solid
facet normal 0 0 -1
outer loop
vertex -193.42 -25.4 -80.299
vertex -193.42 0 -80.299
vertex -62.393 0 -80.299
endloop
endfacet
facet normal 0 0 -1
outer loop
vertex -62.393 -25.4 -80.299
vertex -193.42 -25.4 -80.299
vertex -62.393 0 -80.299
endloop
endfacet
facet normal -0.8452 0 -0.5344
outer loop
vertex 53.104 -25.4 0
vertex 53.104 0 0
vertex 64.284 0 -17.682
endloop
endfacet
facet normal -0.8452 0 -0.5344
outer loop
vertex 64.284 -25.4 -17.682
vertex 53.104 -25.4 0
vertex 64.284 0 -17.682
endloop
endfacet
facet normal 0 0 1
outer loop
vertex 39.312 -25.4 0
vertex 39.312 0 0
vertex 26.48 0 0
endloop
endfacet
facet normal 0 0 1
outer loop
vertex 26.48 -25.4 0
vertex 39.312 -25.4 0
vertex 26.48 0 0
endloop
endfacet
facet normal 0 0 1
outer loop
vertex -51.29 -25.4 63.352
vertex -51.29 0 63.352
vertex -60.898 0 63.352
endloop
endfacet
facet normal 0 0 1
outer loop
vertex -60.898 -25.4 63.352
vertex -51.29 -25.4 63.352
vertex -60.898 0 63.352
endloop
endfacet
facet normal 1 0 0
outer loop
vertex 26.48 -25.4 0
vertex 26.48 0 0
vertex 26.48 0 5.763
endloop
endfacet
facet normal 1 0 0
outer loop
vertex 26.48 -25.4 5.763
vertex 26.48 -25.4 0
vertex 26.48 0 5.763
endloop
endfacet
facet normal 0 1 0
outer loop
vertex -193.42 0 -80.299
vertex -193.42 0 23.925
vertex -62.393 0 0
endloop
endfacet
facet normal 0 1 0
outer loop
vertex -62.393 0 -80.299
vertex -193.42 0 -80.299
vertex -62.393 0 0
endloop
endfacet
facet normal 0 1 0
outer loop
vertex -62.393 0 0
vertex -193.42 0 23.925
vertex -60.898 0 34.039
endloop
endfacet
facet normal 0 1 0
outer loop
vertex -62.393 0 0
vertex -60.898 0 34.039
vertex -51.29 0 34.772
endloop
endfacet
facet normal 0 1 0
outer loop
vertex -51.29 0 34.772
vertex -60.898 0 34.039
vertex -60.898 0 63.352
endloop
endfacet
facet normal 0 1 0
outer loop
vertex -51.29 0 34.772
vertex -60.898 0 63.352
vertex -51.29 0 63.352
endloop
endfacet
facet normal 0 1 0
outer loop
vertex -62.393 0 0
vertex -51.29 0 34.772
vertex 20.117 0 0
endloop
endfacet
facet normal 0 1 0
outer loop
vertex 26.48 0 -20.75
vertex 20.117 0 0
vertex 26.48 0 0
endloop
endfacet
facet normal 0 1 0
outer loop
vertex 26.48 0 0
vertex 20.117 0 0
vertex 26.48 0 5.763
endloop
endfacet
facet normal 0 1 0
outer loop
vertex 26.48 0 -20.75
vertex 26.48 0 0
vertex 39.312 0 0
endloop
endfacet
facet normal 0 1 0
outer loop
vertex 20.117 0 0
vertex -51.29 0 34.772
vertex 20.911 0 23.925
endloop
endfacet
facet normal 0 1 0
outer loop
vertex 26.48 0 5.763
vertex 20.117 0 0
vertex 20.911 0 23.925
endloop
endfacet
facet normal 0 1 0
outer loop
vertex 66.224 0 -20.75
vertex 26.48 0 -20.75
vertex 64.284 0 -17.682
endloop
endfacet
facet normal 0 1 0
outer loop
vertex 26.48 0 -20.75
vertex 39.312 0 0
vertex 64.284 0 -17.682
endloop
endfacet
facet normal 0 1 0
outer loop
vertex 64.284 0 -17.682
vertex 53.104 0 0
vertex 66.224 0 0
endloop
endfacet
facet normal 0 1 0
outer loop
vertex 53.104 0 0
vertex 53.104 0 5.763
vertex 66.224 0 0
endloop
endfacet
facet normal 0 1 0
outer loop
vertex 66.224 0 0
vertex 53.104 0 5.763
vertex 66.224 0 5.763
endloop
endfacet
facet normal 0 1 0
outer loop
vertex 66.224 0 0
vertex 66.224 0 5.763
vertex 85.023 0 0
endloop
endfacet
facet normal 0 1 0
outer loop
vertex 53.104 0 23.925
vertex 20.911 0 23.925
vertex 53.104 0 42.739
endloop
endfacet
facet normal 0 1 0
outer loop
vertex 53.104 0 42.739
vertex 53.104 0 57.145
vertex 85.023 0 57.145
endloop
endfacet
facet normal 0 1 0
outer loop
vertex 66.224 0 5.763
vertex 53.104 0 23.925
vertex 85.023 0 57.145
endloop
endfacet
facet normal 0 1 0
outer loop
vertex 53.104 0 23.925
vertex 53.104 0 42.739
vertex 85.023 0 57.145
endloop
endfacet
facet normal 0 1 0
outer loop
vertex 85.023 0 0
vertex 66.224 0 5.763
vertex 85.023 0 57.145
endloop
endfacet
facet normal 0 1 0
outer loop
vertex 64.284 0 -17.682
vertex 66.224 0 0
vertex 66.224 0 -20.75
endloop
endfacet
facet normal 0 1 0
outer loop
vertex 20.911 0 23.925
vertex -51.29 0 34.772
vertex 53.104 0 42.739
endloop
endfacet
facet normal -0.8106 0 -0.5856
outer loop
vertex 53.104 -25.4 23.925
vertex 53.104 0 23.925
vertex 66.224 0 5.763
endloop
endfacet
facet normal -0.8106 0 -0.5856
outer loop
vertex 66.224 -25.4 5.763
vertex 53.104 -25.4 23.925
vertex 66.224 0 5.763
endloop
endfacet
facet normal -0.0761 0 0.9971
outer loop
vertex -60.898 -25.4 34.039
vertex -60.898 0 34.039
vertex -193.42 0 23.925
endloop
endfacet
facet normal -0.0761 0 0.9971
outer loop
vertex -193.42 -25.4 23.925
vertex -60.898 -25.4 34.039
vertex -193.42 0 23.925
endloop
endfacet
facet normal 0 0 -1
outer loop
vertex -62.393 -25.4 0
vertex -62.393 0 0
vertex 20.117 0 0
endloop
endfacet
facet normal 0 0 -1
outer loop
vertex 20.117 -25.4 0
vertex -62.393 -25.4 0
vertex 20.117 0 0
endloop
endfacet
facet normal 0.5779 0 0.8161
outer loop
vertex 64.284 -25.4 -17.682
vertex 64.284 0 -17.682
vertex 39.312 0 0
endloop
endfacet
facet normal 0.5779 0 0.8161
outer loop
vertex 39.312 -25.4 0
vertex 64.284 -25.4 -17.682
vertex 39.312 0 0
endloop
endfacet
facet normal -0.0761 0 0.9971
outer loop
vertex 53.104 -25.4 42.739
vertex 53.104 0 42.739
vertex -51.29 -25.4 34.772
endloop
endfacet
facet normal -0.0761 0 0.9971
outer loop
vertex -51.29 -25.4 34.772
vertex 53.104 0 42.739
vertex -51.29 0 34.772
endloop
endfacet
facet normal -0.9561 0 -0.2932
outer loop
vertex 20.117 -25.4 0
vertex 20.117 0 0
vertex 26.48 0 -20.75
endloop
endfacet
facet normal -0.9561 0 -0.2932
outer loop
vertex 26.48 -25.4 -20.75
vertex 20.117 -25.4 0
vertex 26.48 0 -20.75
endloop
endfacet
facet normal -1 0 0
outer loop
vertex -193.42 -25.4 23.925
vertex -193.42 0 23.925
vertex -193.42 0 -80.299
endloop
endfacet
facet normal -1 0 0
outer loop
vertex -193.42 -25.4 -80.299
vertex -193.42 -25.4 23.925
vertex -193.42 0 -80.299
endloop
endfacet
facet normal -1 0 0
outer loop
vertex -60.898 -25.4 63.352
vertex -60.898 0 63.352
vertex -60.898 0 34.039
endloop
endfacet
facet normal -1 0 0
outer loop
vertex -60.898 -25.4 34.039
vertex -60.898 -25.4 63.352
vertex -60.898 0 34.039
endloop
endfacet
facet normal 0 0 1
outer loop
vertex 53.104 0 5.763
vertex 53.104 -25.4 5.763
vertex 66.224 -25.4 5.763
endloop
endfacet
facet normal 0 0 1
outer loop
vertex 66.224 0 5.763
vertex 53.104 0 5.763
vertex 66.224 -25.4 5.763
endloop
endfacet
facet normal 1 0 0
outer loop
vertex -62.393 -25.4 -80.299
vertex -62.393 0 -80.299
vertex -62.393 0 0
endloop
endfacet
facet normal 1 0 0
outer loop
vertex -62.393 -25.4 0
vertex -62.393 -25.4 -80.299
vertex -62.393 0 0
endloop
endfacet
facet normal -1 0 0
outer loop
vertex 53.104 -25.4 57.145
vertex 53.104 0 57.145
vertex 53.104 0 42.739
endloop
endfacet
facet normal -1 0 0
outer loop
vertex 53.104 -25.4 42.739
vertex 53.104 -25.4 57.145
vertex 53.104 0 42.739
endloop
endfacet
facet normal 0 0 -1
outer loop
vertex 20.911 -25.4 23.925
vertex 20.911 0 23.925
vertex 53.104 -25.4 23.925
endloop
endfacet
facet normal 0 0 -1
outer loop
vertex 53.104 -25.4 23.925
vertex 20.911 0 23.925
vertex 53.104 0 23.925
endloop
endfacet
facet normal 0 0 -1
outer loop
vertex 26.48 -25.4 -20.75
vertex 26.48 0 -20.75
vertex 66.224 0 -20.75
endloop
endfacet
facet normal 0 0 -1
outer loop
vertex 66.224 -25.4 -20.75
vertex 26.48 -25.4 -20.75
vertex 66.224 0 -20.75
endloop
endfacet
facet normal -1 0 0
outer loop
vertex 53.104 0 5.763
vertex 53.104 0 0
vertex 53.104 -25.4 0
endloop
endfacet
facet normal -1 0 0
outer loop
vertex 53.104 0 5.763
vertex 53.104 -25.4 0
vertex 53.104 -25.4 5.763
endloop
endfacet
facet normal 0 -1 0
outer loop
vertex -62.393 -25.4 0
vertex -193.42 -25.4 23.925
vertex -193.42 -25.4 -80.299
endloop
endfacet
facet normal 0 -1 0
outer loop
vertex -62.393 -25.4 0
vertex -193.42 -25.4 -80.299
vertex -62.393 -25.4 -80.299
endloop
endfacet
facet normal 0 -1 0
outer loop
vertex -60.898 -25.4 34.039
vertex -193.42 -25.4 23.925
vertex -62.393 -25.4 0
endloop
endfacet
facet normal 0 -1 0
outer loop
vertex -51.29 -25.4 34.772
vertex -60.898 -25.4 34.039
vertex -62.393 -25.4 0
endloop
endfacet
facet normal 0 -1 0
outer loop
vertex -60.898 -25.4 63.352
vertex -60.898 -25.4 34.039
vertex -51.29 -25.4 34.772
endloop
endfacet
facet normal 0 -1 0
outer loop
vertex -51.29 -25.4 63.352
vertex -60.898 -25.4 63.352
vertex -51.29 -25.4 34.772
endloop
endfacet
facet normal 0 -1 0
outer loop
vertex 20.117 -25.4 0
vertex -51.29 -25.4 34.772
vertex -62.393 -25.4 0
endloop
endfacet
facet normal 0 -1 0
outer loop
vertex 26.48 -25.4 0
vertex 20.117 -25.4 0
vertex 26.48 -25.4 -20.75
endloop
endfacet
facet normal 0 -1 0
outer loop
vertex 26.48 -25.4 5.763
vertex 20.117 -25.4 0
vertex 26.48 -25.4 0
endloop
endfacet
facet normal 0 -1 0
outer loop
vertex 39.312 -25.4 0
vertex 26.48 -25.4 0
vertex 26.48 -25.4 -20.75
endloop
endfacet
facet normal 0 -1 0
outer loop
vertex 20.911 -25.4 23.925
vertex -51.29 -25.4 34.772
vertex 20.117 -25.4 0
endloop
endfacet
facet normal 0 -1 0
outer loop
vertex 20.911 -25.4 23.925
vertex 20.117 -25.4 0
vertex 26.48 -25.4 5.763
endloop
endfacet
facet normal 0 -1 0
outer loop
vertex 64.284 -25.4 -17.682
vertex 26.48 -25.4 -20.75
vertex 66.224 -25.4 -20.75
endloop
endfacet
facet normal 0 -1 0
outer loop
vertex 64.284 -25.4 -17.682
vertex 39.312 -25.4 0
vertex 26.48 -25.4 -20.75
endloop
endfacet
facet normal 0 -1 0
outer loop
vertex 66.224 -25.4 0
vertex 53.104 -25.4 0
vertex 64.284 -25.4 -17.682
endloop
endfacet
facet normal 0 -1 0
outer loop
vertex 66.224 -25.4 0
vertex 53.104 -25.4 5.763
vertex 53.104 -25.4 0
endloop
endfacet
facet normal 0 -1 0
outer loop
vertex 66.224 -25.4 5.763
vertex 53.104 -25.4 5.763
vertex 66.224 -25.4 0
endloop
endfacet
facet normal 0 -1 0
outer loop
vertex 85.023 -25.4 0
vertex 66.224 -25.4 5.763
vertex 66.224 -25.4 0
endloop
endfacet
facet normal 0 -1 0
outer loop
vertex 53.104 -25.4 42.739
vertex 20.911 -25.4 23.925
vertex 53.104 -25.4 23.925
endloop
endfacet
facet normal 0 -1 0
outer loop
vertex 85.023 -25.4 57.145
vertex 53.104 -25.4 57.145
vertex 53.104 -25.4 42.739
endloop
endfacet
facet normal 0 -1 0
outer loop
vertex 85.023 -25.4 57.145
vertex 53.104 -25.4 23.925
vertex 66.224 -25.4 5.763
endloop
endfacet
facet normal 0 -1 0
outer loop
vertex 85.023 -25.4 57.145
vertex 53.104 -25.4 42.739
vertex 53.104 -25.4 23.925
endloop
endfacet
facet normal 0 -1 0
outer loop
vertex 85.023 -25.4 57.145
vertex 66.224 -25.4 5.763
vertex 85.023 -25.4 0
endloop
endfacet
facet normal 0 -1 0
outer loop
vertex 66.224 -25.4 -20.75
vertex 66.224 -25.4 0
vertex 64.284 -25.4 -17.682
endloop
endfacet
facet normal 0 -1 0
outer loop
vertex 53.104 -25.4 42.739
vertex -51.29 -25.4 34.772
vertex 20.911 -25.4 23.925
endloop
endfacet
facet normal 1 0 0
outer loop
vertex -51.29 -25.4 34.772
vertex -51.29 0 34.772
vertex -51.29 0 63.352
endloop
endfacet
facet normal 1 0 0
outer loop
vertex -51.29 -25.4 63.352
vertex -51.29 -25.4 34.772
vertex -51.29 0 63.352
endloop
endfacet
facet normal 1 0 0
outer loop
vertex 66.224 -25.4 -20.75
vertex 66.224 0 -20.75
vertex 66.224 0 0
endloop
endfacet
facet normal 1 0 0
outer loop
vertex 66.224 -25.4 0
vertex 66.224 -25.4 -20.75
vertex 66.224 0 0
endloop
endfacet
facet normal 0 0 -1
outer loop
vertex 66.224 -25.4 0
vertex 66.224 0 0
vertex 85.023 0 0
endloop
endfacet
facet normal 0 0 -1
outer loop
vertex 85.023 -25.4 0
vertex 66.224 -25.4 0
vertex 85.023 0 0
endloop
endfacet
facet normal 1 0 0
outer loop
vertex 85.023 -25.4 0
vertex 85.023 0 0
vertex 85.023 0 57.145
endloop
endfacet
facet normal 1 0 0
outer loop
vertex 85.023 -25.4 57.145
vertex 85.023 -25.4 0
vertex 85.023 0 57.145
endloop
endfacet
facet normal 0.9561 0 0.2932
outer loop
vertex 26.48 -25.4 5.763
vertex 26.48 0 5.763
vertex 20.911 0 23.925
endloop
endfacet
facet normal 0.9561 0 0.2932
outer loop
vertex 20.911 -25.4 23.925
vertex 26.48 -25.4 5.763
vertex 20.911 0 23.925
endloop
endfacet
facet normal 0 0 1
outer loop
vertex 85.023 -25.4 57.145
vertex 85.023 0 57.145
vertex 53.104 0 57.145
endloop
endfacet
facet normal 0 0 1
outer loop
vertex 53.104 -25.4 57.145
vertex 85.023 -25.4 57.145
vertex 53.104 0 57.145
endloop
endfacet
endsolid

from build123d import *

# Parameters (mm, degrees)
F0_W     = 13.1206735969
F0_H     = 5.7628303766
F0_W_2   = 9.6076056361
F0_H_2   = 23.9247754216
F0_W_3   = 1.4953166246
F1_DEPTH = 25.4


with BuildPart() as f1:
    # F0 (on Front) → F1 (new body)
    with BuildSketch(Plane.XZ):
        Polygon((20.9109149873, 23.9247754216), (53.1037151814, 23.9247754216), (53.1037151814, 42.7394804328), (-51.2902662158, 34.7721107152), (-51.2902662158, 23.9247754216), align=None)
        Polygon((53.1037151814, 42.7394804328), (53.1037151814, 23.9247754216), (66.2243887782, 5.7628303766), (66.2243887782, 0), (85.0230753422, 0), (85.0230753422, 45.1755724388), align=None)
        Polygon((20.1173499505, 0), (20.9109149873, 23.9247754216), (-51.2902662158, 23.9247754216), (-51.2902662158, 0), align=None)
        Polygon((26.4795012772, 5.7628303766), (20.9109149873, 23.9247754216), (20.1173499505, 0), (26.4795012772, 0), align=None)
        with Locations((59.6640519798, 2.8814151883)):
            Rectangle(F0_W, F0_H)
        Polygon((53.1037151814, 57.1449995041), (53.1037151814, 42.7394804328), (85.0230753422, 45.1755724388), (85.0230753422, 57.1449995041), align=None)
        with Locations((-56.0940690339, 11.9623877108)):
            Rectangle(F0_W_2, F0_H_2)
        Polygon((-60.8978718519, 23.9247754216), (-51.2902662158, 23.9247754216), (-51.2902662158, 34.7721107152), (-60.8978718519, 34.0388563151), align=None)
        Polygon((26.4795012772, 0), (20.1173499505, 0), (26.4795012772, -20.7501575351), align=None)
        Polygon((66.2243887782, 0), (53.1037151814, 0), (64.2842540453, -17.6818622185), (66.2243887782, -19.0556111635), align=None)
        Polygon((-60.8978718519, 34.0388563151), (-51.2902662158, 34.7721107152), (-51.2902662158, 63.3518993855), (-60.8978718519, 63.3518993855), align=None)
        with Locations((-61.6455301642, 11.9623877108)):
            Rectangle(F0_W_3, F0_H_2)
        Polygon((-62.3931884766, 23.9247754216), (-60.8978718519, 23.9247754216), (-60.8978718519, 34.0388563151), (-193.4195458889, 23.9247754216), align=None)
        Polygon((39.3123003569, 0), (26.4795012772, 0), (26.4795012772, -20.7501575351), (66.2243887782, -20.7501575351), (64.2842540453, -17.6818622185), align=None)
        Polygon((66.2243887782, -19.0556111635), (64.2842540453, -17.6818622185), (66.2243887782, -20.7501575351), align=None)
        Polygon((-62.3931884766, 0), (-62.3931884766, 23.9247754216), (-193.4195458889, 23.9247754216), (-193.4195458889, -80.2987962961), (-62.3931884766, -80.2987962961), align=None)
    extrude(amount=F1_DEPTH)


solid = f1.part
